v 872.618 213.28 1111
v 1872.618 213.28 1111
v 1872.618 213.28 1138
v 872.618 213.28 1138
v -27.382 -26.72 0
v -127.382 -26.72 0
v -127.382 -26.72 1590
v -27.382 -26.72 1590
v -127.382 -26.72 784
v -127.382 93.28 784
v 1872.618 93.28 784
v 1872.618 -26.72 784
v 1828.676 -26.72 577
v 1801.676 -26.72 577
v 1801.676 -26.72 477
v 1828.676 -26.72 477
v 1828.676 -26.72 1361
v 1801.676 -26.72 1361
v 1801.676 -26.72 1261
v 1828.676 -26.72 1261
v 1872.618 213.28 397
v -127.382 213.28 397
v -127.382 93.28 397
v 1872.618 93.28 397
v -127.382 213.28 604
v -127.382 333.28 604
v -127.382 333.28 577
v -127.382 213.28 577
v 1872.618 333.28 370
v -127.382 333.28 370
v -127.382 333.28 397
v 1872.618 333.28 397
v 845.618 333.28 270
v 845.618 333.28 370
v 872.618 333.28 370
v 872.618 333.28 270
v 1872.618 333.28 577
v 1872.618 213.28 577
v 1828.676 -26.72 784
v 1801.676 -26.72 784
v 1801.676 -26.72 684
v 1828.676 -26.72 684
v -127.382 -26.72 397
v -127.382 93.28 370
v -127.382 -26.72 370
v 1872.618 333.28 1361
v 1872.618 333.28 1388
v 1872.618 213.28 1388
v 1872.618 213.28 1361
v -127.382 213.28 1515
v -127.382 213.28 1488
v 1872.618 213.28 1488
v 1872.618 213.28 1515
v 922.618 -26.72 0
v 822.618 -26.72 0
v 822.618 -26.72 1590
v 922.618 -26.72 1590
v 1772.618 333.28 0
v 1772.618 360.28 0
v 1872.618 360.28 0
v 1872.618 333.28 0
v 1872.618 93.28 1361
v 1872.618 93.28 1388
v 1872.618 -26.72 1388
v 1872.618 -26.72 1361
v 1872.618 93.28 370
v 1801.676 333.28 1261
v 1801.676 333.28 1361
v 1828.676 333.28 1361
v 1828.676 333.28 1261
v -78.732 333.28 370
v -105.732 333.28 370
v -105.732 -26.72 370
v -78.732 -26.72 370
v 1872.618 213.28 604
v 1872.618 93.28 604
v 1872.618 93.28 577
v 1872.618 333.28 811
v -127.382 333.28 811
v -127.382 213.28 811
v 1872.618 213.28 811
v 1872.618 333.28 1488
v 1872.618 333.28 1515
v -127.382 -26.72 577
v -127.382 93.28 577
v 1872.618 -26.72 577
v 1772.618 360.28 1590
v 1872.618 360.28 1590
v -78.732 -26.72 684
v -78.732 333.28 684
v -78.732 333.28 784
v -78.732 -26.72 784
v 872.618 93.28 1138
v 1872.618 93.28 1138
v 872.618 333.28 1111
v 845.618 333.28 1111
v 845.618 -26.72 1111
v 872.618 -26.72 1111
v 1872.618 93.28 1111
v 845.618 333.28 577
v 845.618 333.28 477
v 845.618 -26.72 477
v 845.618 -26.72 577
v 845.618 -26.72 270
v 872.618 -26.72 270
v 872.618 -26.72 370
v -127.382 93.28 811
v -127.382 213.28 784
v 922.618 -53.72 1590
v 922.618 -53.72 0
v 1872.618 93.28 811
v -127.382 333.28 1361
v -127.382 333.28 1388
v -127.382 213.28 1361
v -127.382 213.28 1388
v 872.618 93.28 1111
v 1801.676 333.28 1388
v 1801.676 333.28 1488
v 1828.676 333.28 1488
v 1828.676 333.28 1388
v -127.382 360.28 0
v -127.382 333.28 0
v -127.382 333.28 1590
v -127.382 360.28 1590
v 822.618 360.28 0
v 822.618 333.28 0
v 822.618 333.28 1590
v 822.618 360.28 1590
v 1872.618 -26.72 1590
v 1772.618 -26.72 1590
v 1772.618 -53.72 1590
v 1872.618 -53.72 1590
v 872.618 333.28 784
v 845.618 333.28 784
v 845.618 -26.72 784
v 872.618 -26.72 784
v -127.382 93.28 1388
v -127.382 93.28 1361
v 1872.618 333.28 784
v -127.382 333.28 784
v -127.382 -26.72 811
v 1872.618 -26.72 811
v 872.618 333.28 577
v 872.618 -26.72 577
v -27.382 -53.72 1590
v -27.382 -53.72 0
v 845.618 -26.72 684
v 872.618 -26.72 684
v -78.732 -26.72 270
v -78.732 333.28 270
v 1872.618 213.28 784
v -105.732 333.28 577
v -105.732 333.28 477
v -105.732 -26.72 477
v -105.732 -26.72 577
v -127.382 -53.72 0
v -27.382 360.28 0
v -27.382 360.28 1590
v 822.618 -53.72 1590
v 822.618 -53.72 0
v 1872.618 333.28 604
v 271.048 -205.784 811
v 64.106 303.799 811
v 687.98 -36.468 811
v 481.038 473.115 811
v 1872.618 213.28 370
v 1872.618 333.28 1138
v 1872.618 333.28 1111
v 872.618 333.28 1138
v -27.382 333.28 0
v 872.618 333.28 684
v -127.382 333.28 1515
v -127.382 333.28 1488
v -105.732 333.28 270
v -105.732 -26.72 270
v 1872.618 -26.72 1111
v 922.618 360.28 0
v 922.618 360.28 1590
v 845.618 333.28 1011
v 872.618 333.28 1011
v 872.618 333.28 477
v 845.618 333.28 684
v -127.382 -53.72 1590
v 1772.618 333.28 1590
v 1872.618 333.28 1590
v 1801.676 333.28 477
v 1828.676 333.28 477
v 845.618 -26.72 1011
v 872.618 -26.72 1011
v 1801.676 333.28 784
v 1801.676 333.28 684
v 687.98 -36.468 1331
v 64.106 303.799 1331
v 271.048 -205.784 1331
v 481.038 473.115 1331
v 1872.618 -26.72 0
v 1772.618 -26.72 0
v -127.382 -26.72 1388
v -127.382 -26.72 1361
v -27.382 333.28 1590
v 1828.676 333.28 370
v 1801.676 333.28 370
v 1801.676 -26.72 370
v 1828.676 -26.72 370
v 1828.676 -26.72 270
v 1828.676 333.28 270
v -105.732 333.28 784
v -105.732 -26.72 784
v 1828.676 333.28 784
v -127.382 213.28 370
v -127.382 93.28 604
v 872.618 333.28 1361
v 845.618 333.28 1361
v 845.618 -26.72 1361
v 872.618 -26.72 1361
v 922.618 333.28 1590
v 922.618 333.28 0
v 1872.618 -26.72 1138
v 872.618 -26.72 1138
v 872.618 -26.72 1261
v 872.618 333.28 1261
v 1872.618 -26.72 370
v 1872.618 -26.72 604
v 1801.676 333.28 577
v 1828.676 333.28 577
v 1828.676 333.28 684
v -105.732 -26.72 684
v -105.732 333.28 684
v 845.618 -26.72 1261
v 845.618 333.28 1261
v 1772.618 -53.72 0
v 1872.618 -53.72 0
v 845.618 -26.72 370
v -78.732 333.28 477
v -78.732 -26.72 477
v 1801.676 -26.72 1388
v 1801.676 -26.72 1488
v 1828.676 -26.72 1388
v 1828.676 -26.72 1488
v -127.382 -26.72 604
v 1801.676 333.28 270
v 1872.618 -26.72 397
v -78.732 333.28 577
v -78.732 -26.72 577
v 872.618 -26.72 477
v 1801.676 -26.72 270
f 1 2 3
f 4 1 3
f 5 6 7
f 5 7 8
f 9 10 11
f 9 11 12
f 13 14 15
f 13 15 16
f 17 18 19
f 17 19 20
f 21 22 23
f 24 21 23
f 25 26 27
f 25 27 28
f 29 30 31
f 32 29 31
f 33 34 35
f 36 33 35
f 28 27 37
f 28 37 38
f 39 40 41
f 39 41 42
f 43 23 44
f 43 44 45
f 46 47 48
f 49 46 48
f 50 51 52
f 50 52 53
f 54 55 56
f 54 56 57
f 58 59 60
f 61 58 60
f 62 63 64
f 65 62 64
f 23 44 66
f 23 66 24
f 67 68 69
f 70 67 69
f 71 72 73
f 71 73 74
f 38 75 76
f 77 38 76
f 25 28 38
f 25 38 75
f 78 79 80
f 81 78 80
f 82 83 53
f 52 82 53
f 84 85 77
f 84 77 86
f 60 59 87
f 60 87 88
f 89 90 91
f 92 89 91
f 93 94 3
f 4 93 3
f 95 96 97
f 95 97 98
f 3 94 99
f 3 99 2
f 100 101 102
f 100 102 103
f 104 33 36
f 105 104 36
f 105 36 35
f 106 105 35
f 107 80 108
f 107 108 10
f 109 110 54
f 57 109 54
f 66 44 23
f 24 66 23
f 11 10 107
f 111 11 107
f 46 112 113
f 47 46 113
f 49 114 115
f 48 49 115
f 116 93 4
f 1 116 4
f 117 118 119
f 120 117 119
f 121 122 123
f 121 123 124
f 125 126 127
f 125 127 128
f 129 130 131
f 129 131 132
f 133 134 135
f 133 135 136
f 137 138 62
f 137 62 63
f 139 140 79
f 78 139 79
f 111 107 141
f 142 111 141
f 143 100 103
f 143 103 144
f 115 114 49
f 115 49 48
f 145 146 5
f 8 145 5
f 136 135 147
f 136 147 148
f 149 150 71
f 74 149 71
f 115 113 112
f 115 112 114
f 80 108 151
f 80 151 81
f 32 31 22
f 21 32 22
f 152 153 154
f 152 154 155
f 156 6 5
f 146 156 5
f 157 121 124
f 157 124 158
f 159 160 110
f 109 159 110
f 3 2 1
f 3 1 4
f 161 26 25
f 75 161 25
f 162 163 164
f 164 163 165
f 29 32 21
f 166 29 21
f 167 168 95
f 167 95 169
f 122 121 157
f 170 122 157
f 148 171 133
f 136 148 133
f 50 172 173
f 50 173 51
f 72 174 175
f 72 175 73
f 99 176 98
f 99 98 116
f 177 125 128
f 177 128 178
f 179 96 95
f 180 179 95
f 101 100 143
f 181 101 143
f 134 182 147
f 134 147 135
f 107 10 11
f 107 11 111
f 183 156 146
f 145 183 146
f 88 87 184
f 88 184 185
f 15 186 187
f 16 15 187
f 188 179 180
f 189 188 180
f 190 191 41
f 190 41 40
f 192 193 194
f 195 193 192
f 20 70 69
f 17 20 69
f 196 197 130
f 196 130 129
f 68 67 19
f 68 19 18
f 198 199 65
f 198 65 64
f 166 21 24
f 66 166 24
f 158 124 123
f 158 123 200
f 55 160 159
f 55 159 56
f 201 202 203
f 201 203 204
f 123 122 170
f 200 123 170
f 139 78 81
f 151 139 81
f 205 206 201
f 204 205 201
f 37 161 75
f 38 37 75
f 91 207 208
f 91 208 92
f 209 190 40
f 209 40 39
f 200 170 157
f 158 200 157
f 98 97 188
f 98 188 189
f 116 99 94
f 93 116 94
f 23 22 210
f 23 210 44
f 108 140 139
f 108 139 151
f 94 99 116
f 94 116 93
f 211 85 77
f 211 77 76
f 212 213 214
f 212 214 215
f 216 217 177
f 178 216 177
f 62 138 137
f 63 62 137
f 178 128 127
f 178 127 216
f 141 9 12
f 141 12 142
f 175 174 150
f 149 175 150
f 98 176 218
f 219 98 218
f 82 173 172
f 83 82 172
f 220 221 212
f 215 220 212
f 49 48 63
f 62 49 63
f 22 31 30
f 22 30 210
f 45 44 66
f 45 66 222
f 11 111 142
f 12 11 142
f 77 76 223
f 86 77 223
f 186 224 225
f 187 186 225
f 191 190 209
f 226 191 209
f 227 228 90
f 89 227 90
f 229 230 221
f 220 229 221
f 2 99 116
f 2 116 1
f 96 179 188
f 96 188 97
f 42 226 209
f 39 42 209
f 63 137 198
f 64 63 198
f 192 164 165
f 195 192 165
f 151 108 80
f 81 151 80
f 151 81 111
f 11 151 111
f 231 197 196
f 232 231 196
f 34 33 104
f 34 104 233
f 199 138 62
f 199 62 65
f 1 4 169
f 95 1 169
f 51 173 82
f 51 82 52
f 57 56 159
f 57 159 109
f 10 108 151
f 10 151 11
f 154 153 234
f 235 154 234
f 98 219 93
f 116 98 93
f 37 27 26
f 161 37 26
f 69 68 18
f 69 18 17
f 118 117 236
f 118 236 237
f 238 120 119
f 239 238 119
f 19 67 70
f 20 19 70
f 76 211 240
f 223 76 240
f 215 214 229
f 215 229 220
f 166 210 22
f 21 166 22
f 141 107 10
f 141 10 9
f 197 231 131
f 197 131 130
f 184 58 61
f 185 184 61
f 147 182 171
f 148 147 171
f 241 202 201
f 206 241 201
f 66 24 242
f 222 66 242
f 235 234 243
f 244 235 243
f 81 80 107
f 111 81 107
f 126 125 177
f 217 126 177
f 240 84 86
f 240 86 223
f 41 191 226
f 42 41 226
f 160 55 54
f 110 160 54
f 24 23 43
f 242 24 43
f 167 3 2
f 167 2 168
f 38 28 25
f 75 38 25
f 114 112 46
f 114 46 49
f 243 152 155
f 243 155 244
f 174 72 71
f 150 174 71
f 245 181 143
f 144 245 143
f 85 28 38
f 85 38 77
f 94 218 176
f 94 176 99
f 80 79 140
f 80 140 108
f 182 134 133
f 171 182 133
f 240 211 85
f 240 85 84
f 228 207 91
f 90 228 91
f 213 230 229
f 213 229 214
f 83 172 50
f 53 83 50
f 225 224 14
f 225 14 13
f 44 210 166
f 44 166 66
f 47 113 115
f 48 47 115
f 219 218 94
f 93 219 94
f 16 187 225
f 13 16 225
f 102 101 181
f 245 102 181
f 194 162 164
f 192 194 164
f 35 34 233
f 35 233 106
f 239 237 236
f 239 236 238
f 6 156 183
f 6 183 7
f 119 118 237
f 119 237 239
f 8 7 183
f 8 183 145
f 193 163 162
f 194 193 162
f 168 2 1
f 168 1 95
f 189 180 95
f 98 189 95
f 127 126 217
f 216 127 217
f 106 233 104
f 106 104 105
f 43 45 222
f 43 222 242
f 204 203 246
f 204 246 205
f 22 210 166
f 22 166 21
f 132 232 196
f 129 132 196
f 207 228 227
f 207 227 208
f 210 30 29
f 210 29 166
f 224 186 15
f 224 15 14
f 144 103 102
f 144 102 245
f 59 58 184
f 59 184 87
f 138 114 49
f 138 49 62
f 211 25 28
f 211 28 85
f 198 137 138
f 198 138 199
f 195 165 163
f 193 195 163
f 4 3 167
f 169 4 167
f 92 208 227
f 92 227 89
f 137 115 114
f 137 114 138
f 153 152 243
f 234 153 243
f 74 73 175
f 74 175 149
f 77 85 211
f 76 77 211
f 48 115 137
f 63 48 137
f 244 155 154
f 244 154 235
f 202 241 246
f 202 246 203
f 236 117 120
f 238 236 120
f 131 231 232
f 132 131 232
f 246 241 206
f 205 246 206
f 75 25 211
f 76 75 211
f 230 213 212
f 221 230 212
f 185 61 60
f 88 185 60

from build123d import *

# Parameters (mm, degrees)
F0_W      = 100
F0_H      = 27
F1_DEPTH  = 1590
F2_DEPTH  = 1590
F3_W      = 120
F3_H      = 27
F4_DEPTH  = 2000
F5_DEPTH  = 2000
F6_DEPTH  = 2000
F8_DEPTH  = 520
F9_W      = 120
F9_H      = 27
F10_DEPTH = 1000
F11_DEPTH = 1000
F12_DEPTH = 2000
F13_W     = 27
F13_H     = 100
F14_DEPTH = 360


with BuildPart() as f1:
    # F0 (on Top) → F1 (new body)
    with BuildSketch(Plane.XY):
        with Locations((-77.382376, 346.78042)):
            Rectangle(F0_W, F0_H)
    extrude(amount=F1_DEPTH)

    # F0 (on Top) → F2 (join)
    with BuildSketch(Plane.XY):
        with Locations((-77.382376, 346.78042)):
            Rectangle(F0_W, F0_H)
        with Locations((-77.382376, -40.21958)):
            Rectangle(F0_W, F0_H)
        with Locations((872.617624, 346.78042)):
            Rectangle(F0_W, F0_H)
        with Locations((872.617624, -40.21958)):
            Rectangle(F0_W, F0_H)
        with Locations((1822.617624, 346.78042)):
            Rectangle(F0_W, F0_H)
        with Locations((1822.617624, -40.21958)):
            Rectangle(F0_W, F0_H)
    extrude(amount=F2_DEPTH)


with BuildPart() as f4:
    # F3 (on face) → F4 (new body)
    with BuildSketch(Plane(origin=(-127.382376, 0, 0), x_dir=(0, -1, 0), z_dir=(-1, 0, 0))):
        with Locations((-273.28042, 383.5)):
            Rectangle(F3_W, F3_H)
        with Locations((-33.28042, 383.5)):
            Rectangle(F3_W, F3_H)
    extrude(amount=-F4_DEPTH)


with BuildPart() as f5:
    # F3 (on face) → F5 (new body)
    with BuildSketch(Plane(origin=(-127.382376, 0, 0), x_dir=(0, -1, 0), z_dir=(-1, 0, 0))):
        with Locations((-273.28042, 1374.5)):
            Rectangle(F3_W, F3_H)
        with Locations((-33.28042, 1374.5)):
            Rectangle(F3_W, F3_H)
        with Locations((-33.28042, 797.5)):
            Rectangle(F3_W, F3_H)
        with Locations((-273.28042, 797.5)):
            Rectangle(F3_W, F3_H)
        with Locations((-273.28042, 590.5)):
            Rectangle(F3_W, F3_H)
        with Locations((-33.28042, 590.5)):
            Rectangle(F3_W, F3_H)
    extrude(amount=-F5_DEPTH)


with BuildPart() as f6:
    # F3 (on face) → F6 (new body)
    with BuildSketch(Plane(origin=(-127.382376, 0, 0), x_dir=(0, -1, 0), z_dir=(-1, 0, 0))):
        with Locations((-153.28042, 1374.5)):
            Rectangle(F3_W, F3_H)
        with Locations((-153.28042, 797.5)):
            Rectangle(F3_W, F3_H)
        with Locations((-153.28042, 590.5)):
            Rectangle(F3_W, F3_H)
        with Locations((-153.28042, 383.5)):
            Rectangle(F3_W, F3_H)
    extrude(amount=-F6_DEPTH)


with BuildPart() as f8:
    # F7 (on face) → F8 (new body)
    with BuildSketch(Plane.XY.offset(811)):
        Polygon((481.037676, 473.115087), (64.105951, 303.799002), (271.047832, -205.784218), (687.979557, -36.468133), align=None)
    extrude(amount=F8_DEPTH)


with BuildPart() as f10:
    # F9 (on face) → F10 (new body)
    with BuildSketch(Plane.YZ.offset(1872.617624)):
        with Locations((33.28042, 1124.5)):
            Rectangle(F9_W, F9_H)
        with Locations((273.28042, 1124.5)):
            Rectangle(F9_W, F9_H)
    extrude(amount=-F10_DEPTH)


with BuildPart() as f11:
    # F9 (on face) → F11 (new body)
    with BuildSketch(Plane.YZ.offset(1872.617624)):
        with Locations((153.28042, 1124.5)):
            Rectangle(F9_W, F9_H)
    extrude(amount=-F11_DEPTH)


with BuildPart() as f12:
    # F3 (on face) → F12 (new body)
    with BuildSketch(Plane(origin=(-127.382376, 0, 0), x_dir=(0, -1, 0), z_dir=(-1, 0, 0))):
        with Locations((-273.28042, 1501.5)):
            Rectangle(F3_W, F3_H)
    extrude(amount=-F12_DEPTH)


with BuildPart() as f14:
    # F13 (on face) → F14 (new body, through all)
    with BuildSketch(Plane.XZ.offset(-333.28042)):
        with Locations((1815.176492, 734)):
            Rectangle(F13_W, F13_H)
        with Locations((1815.176492, 527)):
            Rectangle(F13_W, F13_H)
        with Locations((1815.176492, 320)):
            Rectangle(F13_W, F13_H)
        with Locations((1815.176492, 1311)):
            Rectangle(F13_W, F13_H)
        with Locations((859.117624, 734)):
            Rectangle(F13_W, F13_H)
        with Locations((859.117624, 527)):
            Rectangle(F13_W, F13_H)
        with Locations((859.117624, 320)):
            Rectangle(F13_W, F13_H)
        with Locations((859.117624, 1061)):
            Rectangle(F13_W, F13_H)
        with Locations((859.117624, 1311)):
            Rectangle(F13_W, F13_H)
        with Locations((-92.231753, 320)):
            Rectangle(F13_W, F13_H)
        with Locations((-92.231753, 527)):
            Rectangle(F13_W, F13_H)
        with Locations((-92.231753, 734)):
            Rectangle(F13_W, F13_H)
        with Locations((1815.176492, 1438)):
            Rectangle(F13_W, F13_H)
    extrude(amount=F14_DEPTH)


solid = Compound([f1.part, f4.part, f5.part, f6.part, f8.part, f10.part, f11.part, f12.part, f14.part])
